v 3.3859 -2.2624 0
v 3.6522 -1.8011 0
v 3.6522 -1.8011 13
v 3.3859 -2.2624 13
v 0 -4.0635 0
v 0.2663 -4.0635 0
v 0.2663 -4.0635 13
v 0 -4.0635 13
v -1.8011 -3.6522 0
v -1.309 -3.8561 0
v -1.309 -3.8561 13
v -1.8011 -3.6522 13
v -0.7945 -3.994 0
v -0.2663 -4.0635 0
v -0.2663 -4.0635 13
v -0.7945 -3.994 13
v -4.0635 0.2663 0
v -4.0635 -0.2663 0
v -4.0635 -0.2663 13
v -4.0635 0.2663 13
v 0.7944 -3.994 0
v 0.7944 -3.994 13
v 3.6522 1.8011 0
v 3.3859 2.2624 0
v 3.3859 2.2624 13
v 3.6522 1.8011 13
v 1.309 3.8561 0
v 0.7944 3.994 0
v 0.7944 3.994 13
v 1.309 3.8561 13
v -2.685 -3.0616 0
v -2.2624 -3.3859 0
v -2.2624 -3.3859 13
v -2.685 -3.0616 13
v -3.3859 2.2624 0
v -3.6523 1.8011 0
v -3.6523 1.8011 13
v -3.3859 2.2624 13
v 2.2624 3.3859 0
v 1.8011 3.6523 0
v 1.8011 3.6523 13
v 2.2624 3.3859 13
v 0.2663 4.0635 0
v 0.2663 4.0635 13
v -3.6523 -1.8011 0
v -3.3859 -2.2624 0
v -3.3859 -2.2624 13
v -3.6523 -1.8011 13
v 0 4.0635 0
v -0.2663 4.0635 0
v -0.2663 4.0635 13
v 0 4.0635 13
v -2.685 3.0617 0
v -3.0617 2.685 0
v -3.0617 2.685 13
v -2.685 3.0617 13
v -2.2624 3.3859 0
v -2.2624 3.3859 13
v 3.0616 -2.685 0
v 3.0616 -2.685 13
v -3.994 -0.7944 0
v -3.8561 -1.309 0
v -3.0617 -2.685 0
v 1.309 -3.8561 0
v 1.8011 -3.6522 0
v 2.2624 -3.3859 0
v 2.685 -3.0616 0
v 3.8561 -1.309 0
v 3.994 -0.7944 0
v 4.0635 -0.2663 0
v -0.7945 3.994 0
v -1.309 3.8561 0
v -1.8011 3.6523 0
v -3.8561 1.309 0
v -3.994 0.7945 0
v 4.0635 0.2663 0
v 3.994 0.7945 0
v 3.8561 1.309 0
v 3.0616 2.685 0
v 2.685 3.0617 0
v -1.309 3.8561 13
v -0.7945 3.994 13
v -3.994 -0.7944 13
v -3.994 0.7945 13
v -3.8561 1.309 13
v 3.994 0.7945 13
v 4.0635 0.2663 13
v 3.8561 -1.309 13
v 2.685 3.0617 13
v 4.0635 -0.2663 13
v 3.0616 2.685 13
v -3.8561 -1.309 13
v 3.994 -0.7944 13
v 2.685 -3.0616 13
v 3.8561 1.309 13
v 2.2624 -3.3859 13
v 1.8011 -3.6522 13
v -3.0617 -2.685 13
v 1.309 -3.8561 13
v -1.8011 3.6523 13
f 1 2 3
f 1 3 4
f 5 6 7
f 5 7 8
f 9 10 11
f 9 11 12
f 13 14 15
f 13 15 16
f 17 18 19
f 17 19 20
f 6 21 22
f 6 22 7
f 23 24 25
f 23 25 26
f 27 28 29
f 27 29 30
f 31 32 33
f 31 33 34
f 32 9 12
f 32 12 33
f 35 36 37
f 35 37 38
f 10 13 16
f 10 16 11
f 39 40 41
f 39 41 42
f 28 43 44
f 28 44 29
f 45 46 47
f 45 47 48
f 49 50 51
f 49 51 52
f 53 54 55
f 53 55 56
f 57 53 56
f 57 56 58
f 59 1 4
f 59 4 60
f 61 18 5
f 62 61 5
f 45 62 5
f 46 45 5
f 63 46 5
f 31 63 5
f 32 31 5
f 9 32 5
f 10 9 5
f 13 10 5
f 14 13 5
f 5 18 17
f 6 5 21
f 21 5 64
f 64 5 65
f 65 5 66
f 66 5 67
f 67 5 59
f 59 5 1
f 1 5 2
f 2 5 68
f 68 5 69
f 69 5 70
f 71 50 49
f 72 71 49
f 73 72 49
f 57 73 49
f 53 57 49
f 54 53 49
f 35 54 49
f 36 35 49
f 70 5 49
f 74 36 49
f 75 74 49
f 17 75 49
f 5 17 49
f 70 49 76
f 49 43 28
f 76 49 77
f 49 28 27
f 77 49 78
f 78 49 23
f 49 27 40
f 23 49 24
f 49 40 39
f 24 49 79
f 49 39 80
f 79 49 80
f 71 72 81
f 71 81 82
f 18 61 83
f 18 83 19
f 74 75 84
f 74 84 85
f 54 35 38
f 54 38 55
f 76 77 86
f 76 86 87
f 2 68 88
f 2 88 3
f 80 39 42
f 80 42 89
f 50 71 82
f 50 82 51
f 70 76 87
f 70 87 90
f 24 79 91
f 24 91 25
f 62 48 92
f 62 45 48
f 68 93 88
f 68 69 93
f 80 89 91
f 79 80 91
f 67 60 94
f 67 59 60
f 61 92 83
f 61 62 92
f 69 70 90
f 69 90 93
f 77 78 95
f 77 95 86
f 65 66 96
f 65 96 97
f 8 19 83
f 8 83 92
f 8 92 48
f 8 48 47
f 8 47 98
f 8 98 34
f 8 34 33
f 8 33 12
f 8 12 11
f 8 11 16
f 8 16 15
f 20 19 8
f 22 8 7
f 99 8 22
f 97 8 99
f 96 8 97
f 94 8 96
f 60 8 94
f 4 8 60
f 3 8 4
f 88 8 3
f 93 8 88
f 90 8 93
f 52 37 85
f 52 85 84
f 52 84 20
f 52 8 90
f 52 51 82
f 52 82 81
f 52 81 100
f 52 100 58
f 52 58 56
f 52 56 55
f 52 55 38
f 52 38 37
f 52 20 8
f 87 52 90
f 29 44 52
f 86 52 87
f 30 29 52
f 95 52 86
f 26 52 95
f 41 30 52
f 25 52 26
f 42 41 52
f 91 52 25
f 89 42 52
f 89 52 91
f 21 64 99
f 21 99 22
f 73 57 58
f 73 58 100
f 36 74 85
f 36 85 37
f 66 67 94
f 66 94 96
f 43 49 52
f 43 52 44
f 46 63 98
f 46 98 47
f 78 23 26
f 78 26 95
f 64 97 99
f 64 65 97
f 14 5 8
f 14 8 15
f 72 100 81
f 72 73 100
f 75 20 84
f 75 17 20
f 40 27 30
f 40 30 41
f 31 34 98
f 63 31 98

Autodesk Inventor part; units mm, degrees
ref_plane "YZ Plane" through (0, 0, 0) normal (1, 0, 0) x (0, 1, 0)
ref_plane "XZ Plane" through (0, 0, 0) normal (0, 1, 0) x (-1, 0, 0)
ref_plane "XY Plane" through (0, 0, 0) normal (0, 0, 1) x (1, 0, 0)
sketch "C3,5-8, 100uF_213" plane through (0, 0, 0) normal (0, 0, 1) x (1, 0, 0)
  line L0 (-3.994, 0.7945) -> (-3.8561, 1.309)
  line L1 (-3.8561, 1.309) -> (-3.6523, 1.8011)
  line L2 (-3.6523, 1.8011) -> (-3.3859, 2.2624)
  line L3 (-3.3859, 2.2624) -> (-3.0617, 2.685)
  line L4 (-3.0617, 2.685) -> (-2.685, 3.0617)
  line L5 (-2.685, 3.0617) -> (-2.2624, 3.3859)
  line L6 (-2.2624, 3.3859) -> (-1.8011, 3.6523)
  line L7 (-1.8011, 3.6523) -> (-1.309, 3.8561)
  line L8 (-1.309, 3.8561) -> (-0.7945, 3.994)
  line L9 (-0.7945, 3.994) -> (-0.2663, 4.0635)
  line L10 (-0.2663, 4.0635) -> (0, 4.0635)
  line L11 (0, 4.0635) -> (0.2663, 4.0635)
  line L12 (0.2663, 4.0635) -> (0.7944, 3.994)
  line L13 (0.7944, 3.994) -> (1.309, 3.8561)
  line L14 (1.309, 3.8561) -> (1.8011, 3.6523)
  line L15 (1.8011, 3.6523) -> (2.2624, 3.3859)
  line L16 (2.2624, 3.3859) -> (2.685, 3.0617)
  line L17 (2.685, 3.0617) -> (3.0616, 2.685)
  line L18 (3.0616, 2.685) -> (3.3859, 2.2624)
  line L19 (3.3859, 2.2624) -> (3.6522, 1.8011)
  line L20 (3.6522, 1.8011) -> (3.8561, 1.309)
  line L21 (3.8561, 1.309) -> (3.994, 0.7945)
  line L22 (3.994, 0.7945) -> (4.0635, 0.2663)
  line L23 (4.0635, 0.2663) -> (4.0635, -0.2663)
  line L24 (4.0635, -0.2663) -> (3.994, -0.7944)
  line L25 (3.994, -0.7944) -> (3.8561, -1.309)
  line L26 (3.8561, -1.309) -> (3.6522, -1.8011)
  line L27 (3.6522, -1.8011) -> (3.3859, -2.2624)
  line L28 (3.3859, -2.2624) -> (3.0616, -2.685)
  line L29 (3.0616, -2.685) -> (2.685, -3.0616)
  line L30 (2.685, -3.0616) -> (2.2624, -3.3859)
  line L31 (2.2624, -3.3859) -> (1.8011, -3.6522)
  line L32 (1.8011, -3.6522) -> (1.309, -3.8561)
  line L33 (1.309, -3.8561) -> (0.7944, -3.994)
  line L34 (0.7944, -3.994) -> (0.2663, -4.0635)
  line L35 (0.2663, -4.0635) -> (0, -4.0635)
  line L36 (0, -4.0635) -> (-0.2663, -4.0635)
  line L37 (-0.2663, -4.0635) -> (-0.7945, -3.994)
  line L38 (-0.7945, -3.994) -> (-1.309, -3.8561)
  line L39 (-1.309, -3.8561) -> (-1.8011, -3.6522)
  line L40 (-1.8011, -3.6522) -> (-2.2624, -3.3859)
  line L41 (-2.2624, -3.3859) -> (-2.685, -3.0616)
  line L42 (-2.685, -3.0616) -> (-3.0617, -2.685)
  line L43 (-3.0617, -2.685) -> (-3.3859, -2.2624)
  line L44 (-3.3859, -2.2624) -> (-3.6523, -1.8011)
  line L45 (-3.6523, -1.8011) -> (-3.8561, -1.309)
  line L46 (-3.8561, -1.309) -> (-3.994, -0.7944)
  line L47 (-3.994, -0.7944) -> (-4.0635, -0.2663)
  line L48 (-4.0635, -0.2663) -> (-4.0635, 0.2663)
  line L49 (-4.0635, 0.2663) -> (-3.994, 0.7945)
extrude "Extrusion1" add sketch "C3,5-8, 100uF_213" along normal blind 13
properties part number "100uF"
